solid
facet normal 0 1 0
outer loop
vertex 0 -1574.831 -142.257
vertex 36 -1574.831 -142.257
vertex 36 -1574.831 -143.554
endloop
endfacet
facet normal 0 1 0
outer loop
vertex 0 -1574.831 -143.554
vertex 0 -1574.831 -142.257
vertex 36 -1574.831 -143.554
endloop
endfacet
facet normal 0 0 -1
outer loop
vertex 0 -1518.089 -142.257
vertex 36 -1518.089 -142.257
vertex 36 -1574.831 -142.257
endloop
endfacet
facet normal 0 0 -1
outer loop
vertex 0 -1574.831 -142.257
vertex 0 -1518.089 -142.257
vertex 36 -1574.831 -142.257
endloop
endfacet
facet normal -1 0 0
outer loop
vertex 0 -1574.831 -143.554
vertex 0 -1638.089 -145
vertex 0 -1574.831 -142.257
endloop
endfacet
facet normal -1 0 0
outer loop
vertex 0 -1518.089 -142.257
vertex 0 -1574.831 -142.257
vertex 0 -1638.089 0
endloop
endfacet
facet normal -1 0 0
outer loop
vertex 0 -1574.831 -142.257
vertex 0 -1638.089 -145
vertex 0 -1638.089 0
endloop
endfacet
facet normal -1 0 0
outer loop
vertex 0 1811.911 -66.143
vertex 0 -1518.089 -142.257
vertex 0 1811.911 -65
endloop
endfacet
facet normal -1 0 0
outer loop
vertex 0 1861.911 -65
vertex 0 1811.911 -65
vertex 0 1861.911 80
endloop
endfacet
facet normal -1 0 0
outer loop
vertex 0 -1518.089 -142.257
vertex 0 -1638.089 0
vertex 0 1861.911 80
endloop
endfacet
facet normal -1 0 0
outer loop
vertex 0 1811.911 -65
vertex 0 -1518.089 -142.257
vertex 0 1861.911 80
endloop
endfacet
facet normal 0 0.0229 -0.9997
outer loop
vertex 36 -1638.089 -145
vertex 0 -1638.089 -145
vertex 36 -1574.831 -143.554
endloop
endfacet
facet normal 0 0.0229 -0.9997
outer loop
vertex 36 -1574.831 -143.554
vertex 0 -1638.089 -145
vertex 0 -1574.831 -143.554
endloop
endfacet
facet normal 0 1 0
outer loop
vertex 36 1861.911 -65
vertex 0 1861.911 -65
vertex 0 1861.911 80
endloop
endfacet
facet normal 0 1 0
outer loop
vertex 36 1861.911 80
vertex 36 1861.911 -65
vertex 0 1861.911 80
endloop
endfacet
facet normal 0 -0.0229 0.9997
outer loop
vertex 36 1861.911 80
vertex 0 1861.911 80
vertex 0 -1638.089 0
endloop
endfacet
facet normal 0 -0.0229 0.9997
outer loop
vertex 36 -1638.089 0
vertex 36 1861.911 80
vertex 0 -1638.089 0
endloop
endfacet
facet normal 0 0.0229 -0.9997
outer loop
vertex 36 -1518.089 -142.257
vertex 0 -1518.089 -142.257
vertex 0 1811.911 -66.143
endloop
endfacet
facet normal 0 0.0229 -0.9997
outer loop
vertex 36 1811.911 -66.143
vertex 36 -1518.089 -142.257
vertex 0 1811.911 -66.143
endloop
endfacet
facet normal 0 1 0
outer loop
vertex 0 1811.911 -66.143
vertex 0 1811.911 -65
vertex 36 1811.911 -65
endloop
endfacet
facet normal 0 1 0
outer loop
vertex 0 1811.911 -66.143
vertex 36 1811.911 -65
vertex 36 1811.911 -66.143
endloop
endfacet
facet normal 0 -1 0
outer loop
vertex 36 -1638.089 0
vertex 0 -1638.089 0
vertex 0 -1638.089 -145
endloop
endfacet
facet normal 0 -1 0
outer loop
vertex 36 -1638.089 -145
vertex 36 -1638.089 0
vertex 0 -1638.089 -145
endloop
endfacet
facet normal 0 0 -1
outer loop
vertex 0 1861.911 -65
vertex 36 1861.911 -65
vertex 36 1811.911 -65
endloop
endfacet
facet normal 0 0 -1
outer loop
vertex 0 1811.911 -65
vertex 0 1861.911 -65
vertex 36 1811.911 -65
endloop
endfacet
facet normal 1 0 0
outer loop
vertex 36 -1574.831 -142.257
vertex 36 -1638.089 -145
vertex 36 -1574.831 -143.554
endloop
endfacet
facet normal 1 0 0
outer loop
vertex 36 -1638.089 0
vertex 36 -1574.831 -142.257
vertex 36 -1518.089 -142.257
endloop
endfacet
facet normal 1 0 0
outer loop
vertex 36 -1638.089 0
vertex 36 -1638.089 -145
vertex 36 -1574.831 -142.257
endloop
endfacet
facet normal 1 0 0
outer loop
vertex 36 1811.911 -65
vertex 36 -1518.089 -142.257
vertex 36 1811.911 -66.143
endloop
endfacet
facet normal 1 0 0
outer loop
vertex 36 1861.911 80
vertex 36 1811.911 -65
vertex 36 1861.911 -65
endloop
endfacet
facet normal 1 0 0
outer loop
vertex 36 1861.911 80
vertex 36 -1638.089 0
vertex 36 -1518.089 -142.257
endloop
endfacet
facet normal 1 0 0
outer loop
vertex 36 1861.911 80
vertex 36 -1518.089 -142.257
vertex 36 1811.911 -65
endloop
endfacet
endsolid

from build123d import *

# Parameters (mm, degrees)
F1_DEPTH = 36
F3_DEPTH = 36.001
F5_DEPTH = 36.001


with BuildPart() as f1:
    # F0 (on Right) → F1 (new body)
    with BuildSketch(Plane.YZ):
        Polygon((-1638.08888, 0), (-1638.08888, -145), (1861.91112, -65), (1861.91112, 80), align=None)
    extrude(amount=F1_DEPTH)

    # F2 (on face) → F3 (cut, through all)
    with BuildSketch(Plane.YZ.offset(36)):
        Polygon((1874.584966, -79.733009), (1861.91112, -65), (1811.91112, -65), (1811.91112, -79.733009), align=None)
    extrude(amount=-F3_DEPTH, mode=Mode.SUBTRACT)

    # F4 (on face) → F5 (cut, through all)
    with BuildSketch(Plane.YZ.offset(36)):
        Polygon((-1516.11602, -160.75219), (-1518.08888, -142.257143), (-1574.831346, -142.257143), (-1574.831346, -160.75219), align=None)
    extrude(amount=-F5_DEPTH, mode=Mode.SUBTRACT)


solid = f1.part
